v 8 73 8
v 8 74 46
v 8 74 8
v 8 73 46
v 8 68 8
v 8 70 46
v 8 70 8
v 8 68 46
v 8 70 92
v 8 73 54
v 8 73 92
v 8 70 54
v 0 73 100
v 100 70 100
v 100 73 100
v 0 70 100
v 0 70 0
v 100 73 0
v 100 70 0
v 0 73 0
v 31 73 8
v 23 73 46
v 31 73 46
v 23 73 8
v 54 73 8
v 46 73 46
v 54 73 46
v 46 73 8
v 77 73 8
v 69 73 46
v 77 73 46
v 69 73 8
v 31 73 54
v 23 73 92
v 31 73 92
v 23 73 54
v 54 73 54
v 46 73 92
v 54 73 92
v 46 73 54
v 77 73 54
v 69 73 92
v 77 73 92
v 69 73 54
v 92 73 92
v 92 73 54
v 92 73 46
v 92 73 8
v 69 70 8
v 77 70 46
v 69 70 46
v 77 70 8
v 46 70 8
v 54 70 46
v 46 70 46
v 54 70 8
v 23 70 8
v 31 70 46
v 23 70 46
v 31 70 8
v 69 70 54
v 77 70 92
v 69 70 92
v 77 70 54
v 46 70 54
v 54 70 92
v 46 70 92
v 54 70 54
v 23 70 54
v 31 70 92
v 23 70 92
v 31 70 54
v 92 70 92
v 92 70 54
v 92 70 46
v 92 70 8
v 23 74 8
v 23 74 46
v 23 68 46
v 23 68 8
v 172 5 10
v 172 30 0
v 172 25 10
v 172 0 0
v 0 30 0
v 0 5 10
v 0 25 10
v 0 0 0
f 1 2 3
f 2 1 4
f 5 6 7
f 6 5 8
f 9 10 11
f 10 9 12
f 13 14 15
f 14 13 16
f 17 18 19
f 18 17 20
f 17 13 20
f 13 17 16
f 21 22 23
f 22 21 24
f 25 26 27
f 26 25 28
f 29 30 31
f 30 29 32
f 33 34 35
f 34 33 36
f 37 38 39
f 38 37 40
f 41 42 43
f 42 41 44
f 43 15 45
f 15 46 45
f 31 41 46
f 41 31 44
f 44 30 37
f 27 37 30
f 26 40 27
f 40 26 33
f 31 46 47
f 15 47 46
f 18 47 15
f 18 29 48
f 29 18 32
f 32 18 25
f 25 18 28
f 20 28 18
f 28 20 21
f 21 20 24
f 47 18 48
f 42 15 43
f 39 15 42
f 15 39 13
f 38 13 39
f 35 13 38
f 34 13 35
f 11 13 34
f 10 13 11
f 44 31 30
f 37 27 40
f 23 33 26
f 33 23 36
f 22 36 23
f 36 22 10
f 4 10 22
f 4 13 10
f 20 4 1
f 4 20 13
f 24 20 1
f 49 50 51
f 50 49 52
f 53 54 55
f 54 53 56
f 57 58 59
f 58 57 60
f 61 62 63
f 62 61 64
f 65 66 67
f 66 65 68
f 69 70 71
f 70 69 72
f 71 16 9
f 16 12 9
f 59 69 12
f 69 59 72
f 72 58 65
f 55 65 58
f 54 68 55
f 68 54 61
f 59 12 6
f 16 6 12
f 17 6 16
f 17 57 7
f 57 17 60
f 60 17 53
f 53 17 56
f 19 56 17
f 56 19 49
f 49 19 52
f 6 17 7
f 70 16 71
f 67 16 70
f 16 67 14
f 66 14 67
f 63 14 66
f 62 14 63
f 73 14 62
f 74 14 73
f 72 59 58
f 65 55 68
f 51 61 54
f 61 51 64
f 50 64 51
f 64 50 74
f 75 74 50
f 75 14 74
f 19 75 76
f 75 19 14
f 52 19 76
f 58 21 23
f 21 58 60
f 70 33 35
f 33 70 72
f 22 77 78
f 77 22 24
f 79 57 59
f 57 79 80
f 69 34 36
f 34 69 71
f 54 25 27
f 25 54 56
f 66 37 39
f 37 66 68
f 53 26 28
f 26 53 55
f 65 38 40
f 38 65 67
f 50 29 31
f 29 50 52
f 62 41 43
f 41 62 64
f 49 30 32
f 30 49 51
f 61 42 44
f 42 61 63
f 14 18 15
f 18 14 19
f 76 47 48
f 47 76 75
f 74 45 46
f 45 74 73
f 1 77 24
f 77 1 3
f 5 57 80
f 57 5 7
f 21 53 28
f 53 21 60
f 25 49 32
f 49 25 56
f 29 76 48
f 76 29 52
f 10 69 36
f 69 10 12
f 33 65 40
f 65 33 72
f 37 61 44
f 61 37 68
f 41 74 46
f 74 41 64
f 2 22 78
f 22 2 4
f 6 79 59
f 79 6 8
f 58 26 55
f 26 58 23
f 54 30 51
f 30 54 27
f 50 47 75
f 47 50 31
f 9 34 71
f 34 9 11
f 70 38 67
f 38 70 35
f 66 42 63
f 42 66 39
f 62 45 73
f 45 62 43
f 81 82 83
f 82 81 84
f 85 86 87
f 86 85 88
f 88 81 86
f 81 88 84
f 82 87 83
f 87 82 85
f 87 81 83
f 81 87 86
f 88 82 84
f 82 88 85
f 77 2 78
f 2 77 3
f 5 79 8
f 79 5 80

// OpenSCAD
//helper
{
    /**
 * Standard right-angled triangle
 *
 * @param number  o_len  Length of the opposite side
 * @param number  a_len  Length of the adjacent side
 * @param number  depth  How wide/deep the triangle is in the 3rd dimension
 * @param boolean center Whether to center the triangle on the origin
 * @todo a better way ?
 */
module triangle(o_len, a_len, depth, center=false)
{
    centroid = center ? [-a_len/3, -o_len/3, -depth/2] : [0, 0, 0];
    translate(centroid) linear_extrude(height=depth)
    {
        polygon(points=[[0,0],[a_len,0],[0,o_len]], paths=[[0,1,2]]);
    }
}

module trapez3d(bottom = 30, top = 25, height = 10, length = 172){
    hull(){
            trapez(bottom, top, height);
            translate([length,0,0])
            trapez(bottom, top, height);
    }
}

translate([0,0,0])
trapez3d();

module trapez(bottom = 30, top = 25, height = 10){
    off = (bottom-top);
    CubePoints = [
  [  0,  0,  0 ],  //0
  [ 0,  bottom,  0 ],  //1
  [ 0,  bottom-off,  height ],  //2
  [  0,  off,  height ]  //3
];
CubeFaces = [
  [0,1,2,3]  // bottom
  ]; // left

polyhedron( CubePoints, CubeFaces );
}

}

function step_size(total, bar_width, steps) = (total-bar_width)/steps;

module grid(grid_width=40, grid_height=60, steps_wide=2, steps_high=3, bar_width=1, bar_depth=3, name="grid"){


    step_width = step_size(grid_width, bar_width, steps_wide);
    step_height = step_size(grid_height, bar_width, steps_high);

    if(name != "grid")
        echo (name, " steps ", step_width, step_height);

    if(steps_wide>0){
    for(s_wide=[0:steps_wide]){
        translate([s_wide*step_width,0,0])
        cube([bar_width, bar_depth, grid_height]);
    }}

    if(steps_high>0){
    for(s_height=[0:steps_high]){
        translate([0,0,s_height*step_height])
        cube([grid_width, bar_depth, bar_width]);
    }}

}

border = 8;
wide=4;
height=2;
translate([0,70,0])
grid(100,100, wide, height, bar_width=border);

// sample cube to fit in the hole

color("#00FFFF50")
translate([border,68, border])
cube([step_size(100,border,wide)-border,6,step_size(100,border,height)-border]);
